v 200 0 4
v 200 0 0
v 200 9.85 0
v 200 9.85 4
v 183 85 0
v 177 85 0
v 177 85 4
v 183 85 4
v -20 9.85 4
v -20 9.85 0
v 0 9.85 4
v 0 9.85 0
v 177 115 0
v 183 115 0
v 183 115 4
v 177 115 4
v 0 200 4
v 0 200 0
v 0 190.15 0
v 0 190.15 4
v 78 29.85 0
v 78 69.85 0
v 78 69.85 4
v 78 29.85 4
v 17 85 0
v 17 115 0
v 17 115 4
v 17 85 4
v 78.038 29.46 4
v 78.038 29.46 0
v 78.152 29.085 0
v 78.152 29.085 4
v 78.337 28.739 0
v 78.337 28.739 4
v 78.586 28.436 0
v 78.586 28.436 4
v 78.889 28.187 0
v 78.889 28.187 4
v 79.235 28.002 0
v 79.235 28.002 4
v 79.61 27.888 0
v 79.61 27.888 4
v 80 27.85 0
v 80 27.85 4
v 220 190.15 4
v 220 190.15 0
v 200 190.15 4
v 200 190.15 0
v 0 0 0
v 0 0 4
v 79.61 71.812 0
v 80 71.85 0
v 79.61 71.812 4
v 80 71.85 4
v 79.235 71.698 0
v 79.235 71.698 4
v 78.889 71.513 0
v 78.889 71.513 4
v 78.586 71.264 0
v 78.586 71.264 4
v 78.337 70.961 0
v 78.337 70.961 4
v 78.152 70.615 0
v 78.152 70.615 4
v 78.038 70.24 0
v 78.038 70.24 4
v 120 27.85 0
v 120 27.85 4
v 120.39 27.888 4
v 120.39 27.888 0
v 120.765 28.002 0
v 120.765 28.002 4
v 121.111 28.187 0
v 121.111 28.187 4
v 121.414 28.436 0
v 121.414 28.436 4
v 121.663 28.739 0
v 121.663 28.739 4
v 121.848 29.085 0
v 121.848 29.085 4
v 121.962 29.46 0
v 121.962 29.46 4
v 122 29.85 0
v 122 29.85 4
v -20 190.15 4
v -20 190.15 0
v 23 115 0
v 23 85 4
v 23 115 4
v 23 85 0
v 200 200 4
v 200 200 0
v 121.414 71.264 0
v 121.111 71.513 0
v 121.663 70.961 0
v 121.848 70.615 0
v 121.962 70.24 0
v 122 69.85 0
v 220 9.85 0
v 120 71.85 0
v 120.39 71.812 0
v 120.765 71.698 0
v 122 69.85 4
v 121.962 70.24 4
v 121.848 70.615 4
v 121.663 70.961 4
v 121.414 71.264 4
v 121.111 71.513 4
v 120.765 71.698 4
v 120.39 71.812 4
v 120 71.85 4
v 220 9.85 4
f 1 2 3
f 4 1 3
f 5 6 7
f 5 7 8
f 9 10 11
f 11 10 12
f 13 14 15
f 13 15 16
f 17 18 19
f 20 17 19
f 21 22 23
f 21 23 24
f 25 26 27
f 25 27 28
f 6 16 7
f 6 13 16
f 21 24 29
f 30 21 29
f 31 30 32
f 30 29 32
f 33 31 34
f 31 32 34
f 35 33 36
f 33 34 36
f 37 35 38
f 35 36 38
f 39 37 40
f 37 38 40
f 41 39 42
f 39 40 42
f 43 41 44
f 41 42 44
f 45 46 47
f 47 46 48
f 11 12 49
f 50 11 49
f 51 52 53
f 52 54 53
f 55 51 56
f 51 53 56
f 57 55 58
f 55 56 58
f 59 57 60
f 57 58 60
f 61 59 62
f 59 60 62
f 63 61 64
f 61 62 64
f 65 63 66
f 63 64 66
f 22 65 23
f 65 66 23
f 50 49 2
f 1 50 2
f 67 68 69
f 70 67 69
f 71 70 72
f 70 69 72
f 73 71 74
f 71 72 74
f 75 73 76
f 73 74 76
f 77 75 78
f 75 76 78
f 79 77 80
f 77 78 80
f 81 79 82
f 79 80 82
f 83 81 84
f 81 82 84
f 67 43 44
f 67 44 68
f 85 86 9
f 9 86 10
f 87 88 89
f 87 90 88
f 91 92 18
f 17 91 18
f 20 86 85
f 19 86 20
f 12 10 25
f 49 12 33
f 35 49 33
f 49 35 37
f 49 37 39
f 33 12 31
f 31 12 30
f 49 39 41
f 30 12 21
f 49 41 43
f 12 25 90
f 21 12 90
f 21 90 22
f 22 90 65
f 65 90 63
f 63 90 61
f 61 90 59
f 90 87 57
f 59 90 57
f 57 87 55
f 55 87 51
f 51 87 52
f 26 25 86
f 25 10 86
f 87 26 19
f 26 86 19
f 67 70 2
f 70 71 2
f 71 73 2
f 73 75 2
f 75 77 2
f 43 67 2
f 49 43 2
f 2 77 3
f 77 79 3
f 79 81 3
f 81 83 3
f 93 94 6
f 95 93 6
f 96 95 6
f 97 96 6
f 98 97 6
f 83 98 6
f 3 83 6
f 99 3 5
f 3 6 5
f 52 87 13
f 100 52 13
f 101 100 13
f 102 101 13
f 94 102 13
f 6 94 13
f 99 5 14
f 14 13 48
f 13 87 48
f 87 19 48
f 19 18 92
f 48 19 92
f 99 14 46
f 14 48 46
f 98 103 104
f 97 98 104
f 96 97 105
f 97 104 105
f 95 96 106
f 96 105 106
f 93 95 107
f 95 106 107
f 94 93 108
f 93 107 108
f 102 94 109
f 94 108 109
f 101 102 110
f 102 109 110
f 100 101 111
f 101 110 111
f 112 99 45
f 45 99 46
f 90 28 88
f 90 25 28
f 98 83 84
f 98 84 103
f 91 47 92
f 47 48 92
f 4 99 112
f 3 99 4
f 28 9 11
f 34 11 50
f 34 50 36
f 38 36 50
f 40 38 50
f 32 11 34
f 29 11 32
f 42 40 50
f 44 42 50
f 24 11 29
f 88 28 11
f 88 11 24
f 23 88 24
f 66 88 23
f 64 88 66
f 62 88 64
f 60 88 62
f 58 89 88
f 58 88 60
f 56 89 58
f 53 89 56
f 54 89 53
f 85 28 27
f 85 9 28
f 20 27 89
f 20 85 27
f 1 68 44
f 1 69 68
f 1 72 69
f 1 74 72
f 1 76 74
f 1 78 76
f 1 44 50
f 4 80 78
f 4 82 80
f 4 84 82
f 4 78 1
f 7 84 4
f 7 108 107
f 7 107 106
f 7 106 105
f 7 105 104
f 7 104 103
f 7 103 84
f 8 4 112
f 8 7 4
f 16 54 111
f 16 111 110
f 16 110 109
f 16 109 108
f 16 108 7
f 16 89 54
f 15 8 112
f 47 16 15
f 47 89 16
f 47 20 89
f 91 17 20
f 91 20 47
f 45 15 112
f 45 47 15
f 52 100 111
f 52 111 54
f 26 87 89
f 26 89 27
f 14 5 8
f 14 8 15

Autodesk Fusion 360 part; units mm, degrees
sketch "Schizzo1" plane through (0, 0, 0) normal (0, 0, 1) x (1, 0, 0)
  line L0 (0, 0) -> (200, 0)
  line L1 (200, 0) -> (200, 200)
  line L2 (200, 200) -> (0, 200)
  line L3 (0, 200) -> (0, 0)
  line L4 (0, 100) -> (200, 100) construction
  line L5 (200, 100) -> (220, 100) construction
  line L6 (0, 100) -> (-20, 100) construction
  line L7 (220, 100) -> (220, 190.15)
  line L8 (220, 190.15) -> (200, 190.15)
  line L9 (220, 100) -> (220, 9.85)
  line L10 (220, 9.85) -> (200, 9.85)
  line L11 (-20, 100) -> (-20, 190.15)
  line L12 (-20, 190.15) -> (0, 190.15)
  line L13 (-20, 100) -> (-20, 9.85)
  line L14 (-20, 9.85) -> (0, 9.85)
  line L15 (0, 190.15) -> (200, 190.15) construction
  line L16 (200, 9.85) -> (0, 9.85) construction
  line L17 (0, 49.85) -> (200, 49.85) construction
  line L18 (122, 71.85) -> (78, 71.85)
  line L19 (78, 71.85) -> (78, 27.85)
  line L20 (78, 27.85) -> (122, 27.85)
  line L21 (122, 27.85) -> (122, 71.85)
  line L22 (122, 71.85) -> (78, 27.85) construction
  line L23 (78, 71.85) -> (122, 27.85) construction
  line L24 (23, 115) -> (17, 115)
  line L25 (17, 115) -> (17, 85)
  line L26 (17, 85) -> (23, 85)
  line L27 (23, 85) -> (23, 115)
  line L28 (23, 115) -> (17, 85) construction
  line L29 (17, 115) -> (23, 85) construction
  line L30 (183, 115) -> (177, 115)
  line L31 (177, 115) -> (177, 85)
  line L32 (177, 85) -> (183, 85)
  line L33 (183, 85) -> (183, 115)
  line L34 (183, 115) -> (177, 85) construction
  line L35 (177, 115) -> (183, 85) construction
  point P0 (100, 49.85)
  point P1 (20, 100)
  point P2 (180, 100)
  dimension "d1" = 200
  dimension "d2" = 200
  dimension "d3" = 180.3
  dimension "d4" = 20
  dimension "d10" = 40
  dimension "d11" = 44
  dimension "d12" = 44
  dimension "d15" = 20
  dimension "d16" = 20
  dimension "d17" = 30
  dimension "d18" = 6
  dimension "d19" = 6
  dimension "d20" = 30
extrude "Estrusione1" add sketch "Schizzo1" along normal blind 4
fillet "Raccordo1" radius 2 4 edges at (122, 27.85, 2) (78, 27.85, 2) (78, 71.85, 2) (122, 71.85, 2)
component "Component" placed x (1, 0, 0) y (0, 1, 0) z (0, 0, 1) at (0, 0, 0)
equation "d3 = 180 mm + 2 * t"
equation "h = 4 mm"
equation "t = 0.15 mm"
equation "d7 = h"
